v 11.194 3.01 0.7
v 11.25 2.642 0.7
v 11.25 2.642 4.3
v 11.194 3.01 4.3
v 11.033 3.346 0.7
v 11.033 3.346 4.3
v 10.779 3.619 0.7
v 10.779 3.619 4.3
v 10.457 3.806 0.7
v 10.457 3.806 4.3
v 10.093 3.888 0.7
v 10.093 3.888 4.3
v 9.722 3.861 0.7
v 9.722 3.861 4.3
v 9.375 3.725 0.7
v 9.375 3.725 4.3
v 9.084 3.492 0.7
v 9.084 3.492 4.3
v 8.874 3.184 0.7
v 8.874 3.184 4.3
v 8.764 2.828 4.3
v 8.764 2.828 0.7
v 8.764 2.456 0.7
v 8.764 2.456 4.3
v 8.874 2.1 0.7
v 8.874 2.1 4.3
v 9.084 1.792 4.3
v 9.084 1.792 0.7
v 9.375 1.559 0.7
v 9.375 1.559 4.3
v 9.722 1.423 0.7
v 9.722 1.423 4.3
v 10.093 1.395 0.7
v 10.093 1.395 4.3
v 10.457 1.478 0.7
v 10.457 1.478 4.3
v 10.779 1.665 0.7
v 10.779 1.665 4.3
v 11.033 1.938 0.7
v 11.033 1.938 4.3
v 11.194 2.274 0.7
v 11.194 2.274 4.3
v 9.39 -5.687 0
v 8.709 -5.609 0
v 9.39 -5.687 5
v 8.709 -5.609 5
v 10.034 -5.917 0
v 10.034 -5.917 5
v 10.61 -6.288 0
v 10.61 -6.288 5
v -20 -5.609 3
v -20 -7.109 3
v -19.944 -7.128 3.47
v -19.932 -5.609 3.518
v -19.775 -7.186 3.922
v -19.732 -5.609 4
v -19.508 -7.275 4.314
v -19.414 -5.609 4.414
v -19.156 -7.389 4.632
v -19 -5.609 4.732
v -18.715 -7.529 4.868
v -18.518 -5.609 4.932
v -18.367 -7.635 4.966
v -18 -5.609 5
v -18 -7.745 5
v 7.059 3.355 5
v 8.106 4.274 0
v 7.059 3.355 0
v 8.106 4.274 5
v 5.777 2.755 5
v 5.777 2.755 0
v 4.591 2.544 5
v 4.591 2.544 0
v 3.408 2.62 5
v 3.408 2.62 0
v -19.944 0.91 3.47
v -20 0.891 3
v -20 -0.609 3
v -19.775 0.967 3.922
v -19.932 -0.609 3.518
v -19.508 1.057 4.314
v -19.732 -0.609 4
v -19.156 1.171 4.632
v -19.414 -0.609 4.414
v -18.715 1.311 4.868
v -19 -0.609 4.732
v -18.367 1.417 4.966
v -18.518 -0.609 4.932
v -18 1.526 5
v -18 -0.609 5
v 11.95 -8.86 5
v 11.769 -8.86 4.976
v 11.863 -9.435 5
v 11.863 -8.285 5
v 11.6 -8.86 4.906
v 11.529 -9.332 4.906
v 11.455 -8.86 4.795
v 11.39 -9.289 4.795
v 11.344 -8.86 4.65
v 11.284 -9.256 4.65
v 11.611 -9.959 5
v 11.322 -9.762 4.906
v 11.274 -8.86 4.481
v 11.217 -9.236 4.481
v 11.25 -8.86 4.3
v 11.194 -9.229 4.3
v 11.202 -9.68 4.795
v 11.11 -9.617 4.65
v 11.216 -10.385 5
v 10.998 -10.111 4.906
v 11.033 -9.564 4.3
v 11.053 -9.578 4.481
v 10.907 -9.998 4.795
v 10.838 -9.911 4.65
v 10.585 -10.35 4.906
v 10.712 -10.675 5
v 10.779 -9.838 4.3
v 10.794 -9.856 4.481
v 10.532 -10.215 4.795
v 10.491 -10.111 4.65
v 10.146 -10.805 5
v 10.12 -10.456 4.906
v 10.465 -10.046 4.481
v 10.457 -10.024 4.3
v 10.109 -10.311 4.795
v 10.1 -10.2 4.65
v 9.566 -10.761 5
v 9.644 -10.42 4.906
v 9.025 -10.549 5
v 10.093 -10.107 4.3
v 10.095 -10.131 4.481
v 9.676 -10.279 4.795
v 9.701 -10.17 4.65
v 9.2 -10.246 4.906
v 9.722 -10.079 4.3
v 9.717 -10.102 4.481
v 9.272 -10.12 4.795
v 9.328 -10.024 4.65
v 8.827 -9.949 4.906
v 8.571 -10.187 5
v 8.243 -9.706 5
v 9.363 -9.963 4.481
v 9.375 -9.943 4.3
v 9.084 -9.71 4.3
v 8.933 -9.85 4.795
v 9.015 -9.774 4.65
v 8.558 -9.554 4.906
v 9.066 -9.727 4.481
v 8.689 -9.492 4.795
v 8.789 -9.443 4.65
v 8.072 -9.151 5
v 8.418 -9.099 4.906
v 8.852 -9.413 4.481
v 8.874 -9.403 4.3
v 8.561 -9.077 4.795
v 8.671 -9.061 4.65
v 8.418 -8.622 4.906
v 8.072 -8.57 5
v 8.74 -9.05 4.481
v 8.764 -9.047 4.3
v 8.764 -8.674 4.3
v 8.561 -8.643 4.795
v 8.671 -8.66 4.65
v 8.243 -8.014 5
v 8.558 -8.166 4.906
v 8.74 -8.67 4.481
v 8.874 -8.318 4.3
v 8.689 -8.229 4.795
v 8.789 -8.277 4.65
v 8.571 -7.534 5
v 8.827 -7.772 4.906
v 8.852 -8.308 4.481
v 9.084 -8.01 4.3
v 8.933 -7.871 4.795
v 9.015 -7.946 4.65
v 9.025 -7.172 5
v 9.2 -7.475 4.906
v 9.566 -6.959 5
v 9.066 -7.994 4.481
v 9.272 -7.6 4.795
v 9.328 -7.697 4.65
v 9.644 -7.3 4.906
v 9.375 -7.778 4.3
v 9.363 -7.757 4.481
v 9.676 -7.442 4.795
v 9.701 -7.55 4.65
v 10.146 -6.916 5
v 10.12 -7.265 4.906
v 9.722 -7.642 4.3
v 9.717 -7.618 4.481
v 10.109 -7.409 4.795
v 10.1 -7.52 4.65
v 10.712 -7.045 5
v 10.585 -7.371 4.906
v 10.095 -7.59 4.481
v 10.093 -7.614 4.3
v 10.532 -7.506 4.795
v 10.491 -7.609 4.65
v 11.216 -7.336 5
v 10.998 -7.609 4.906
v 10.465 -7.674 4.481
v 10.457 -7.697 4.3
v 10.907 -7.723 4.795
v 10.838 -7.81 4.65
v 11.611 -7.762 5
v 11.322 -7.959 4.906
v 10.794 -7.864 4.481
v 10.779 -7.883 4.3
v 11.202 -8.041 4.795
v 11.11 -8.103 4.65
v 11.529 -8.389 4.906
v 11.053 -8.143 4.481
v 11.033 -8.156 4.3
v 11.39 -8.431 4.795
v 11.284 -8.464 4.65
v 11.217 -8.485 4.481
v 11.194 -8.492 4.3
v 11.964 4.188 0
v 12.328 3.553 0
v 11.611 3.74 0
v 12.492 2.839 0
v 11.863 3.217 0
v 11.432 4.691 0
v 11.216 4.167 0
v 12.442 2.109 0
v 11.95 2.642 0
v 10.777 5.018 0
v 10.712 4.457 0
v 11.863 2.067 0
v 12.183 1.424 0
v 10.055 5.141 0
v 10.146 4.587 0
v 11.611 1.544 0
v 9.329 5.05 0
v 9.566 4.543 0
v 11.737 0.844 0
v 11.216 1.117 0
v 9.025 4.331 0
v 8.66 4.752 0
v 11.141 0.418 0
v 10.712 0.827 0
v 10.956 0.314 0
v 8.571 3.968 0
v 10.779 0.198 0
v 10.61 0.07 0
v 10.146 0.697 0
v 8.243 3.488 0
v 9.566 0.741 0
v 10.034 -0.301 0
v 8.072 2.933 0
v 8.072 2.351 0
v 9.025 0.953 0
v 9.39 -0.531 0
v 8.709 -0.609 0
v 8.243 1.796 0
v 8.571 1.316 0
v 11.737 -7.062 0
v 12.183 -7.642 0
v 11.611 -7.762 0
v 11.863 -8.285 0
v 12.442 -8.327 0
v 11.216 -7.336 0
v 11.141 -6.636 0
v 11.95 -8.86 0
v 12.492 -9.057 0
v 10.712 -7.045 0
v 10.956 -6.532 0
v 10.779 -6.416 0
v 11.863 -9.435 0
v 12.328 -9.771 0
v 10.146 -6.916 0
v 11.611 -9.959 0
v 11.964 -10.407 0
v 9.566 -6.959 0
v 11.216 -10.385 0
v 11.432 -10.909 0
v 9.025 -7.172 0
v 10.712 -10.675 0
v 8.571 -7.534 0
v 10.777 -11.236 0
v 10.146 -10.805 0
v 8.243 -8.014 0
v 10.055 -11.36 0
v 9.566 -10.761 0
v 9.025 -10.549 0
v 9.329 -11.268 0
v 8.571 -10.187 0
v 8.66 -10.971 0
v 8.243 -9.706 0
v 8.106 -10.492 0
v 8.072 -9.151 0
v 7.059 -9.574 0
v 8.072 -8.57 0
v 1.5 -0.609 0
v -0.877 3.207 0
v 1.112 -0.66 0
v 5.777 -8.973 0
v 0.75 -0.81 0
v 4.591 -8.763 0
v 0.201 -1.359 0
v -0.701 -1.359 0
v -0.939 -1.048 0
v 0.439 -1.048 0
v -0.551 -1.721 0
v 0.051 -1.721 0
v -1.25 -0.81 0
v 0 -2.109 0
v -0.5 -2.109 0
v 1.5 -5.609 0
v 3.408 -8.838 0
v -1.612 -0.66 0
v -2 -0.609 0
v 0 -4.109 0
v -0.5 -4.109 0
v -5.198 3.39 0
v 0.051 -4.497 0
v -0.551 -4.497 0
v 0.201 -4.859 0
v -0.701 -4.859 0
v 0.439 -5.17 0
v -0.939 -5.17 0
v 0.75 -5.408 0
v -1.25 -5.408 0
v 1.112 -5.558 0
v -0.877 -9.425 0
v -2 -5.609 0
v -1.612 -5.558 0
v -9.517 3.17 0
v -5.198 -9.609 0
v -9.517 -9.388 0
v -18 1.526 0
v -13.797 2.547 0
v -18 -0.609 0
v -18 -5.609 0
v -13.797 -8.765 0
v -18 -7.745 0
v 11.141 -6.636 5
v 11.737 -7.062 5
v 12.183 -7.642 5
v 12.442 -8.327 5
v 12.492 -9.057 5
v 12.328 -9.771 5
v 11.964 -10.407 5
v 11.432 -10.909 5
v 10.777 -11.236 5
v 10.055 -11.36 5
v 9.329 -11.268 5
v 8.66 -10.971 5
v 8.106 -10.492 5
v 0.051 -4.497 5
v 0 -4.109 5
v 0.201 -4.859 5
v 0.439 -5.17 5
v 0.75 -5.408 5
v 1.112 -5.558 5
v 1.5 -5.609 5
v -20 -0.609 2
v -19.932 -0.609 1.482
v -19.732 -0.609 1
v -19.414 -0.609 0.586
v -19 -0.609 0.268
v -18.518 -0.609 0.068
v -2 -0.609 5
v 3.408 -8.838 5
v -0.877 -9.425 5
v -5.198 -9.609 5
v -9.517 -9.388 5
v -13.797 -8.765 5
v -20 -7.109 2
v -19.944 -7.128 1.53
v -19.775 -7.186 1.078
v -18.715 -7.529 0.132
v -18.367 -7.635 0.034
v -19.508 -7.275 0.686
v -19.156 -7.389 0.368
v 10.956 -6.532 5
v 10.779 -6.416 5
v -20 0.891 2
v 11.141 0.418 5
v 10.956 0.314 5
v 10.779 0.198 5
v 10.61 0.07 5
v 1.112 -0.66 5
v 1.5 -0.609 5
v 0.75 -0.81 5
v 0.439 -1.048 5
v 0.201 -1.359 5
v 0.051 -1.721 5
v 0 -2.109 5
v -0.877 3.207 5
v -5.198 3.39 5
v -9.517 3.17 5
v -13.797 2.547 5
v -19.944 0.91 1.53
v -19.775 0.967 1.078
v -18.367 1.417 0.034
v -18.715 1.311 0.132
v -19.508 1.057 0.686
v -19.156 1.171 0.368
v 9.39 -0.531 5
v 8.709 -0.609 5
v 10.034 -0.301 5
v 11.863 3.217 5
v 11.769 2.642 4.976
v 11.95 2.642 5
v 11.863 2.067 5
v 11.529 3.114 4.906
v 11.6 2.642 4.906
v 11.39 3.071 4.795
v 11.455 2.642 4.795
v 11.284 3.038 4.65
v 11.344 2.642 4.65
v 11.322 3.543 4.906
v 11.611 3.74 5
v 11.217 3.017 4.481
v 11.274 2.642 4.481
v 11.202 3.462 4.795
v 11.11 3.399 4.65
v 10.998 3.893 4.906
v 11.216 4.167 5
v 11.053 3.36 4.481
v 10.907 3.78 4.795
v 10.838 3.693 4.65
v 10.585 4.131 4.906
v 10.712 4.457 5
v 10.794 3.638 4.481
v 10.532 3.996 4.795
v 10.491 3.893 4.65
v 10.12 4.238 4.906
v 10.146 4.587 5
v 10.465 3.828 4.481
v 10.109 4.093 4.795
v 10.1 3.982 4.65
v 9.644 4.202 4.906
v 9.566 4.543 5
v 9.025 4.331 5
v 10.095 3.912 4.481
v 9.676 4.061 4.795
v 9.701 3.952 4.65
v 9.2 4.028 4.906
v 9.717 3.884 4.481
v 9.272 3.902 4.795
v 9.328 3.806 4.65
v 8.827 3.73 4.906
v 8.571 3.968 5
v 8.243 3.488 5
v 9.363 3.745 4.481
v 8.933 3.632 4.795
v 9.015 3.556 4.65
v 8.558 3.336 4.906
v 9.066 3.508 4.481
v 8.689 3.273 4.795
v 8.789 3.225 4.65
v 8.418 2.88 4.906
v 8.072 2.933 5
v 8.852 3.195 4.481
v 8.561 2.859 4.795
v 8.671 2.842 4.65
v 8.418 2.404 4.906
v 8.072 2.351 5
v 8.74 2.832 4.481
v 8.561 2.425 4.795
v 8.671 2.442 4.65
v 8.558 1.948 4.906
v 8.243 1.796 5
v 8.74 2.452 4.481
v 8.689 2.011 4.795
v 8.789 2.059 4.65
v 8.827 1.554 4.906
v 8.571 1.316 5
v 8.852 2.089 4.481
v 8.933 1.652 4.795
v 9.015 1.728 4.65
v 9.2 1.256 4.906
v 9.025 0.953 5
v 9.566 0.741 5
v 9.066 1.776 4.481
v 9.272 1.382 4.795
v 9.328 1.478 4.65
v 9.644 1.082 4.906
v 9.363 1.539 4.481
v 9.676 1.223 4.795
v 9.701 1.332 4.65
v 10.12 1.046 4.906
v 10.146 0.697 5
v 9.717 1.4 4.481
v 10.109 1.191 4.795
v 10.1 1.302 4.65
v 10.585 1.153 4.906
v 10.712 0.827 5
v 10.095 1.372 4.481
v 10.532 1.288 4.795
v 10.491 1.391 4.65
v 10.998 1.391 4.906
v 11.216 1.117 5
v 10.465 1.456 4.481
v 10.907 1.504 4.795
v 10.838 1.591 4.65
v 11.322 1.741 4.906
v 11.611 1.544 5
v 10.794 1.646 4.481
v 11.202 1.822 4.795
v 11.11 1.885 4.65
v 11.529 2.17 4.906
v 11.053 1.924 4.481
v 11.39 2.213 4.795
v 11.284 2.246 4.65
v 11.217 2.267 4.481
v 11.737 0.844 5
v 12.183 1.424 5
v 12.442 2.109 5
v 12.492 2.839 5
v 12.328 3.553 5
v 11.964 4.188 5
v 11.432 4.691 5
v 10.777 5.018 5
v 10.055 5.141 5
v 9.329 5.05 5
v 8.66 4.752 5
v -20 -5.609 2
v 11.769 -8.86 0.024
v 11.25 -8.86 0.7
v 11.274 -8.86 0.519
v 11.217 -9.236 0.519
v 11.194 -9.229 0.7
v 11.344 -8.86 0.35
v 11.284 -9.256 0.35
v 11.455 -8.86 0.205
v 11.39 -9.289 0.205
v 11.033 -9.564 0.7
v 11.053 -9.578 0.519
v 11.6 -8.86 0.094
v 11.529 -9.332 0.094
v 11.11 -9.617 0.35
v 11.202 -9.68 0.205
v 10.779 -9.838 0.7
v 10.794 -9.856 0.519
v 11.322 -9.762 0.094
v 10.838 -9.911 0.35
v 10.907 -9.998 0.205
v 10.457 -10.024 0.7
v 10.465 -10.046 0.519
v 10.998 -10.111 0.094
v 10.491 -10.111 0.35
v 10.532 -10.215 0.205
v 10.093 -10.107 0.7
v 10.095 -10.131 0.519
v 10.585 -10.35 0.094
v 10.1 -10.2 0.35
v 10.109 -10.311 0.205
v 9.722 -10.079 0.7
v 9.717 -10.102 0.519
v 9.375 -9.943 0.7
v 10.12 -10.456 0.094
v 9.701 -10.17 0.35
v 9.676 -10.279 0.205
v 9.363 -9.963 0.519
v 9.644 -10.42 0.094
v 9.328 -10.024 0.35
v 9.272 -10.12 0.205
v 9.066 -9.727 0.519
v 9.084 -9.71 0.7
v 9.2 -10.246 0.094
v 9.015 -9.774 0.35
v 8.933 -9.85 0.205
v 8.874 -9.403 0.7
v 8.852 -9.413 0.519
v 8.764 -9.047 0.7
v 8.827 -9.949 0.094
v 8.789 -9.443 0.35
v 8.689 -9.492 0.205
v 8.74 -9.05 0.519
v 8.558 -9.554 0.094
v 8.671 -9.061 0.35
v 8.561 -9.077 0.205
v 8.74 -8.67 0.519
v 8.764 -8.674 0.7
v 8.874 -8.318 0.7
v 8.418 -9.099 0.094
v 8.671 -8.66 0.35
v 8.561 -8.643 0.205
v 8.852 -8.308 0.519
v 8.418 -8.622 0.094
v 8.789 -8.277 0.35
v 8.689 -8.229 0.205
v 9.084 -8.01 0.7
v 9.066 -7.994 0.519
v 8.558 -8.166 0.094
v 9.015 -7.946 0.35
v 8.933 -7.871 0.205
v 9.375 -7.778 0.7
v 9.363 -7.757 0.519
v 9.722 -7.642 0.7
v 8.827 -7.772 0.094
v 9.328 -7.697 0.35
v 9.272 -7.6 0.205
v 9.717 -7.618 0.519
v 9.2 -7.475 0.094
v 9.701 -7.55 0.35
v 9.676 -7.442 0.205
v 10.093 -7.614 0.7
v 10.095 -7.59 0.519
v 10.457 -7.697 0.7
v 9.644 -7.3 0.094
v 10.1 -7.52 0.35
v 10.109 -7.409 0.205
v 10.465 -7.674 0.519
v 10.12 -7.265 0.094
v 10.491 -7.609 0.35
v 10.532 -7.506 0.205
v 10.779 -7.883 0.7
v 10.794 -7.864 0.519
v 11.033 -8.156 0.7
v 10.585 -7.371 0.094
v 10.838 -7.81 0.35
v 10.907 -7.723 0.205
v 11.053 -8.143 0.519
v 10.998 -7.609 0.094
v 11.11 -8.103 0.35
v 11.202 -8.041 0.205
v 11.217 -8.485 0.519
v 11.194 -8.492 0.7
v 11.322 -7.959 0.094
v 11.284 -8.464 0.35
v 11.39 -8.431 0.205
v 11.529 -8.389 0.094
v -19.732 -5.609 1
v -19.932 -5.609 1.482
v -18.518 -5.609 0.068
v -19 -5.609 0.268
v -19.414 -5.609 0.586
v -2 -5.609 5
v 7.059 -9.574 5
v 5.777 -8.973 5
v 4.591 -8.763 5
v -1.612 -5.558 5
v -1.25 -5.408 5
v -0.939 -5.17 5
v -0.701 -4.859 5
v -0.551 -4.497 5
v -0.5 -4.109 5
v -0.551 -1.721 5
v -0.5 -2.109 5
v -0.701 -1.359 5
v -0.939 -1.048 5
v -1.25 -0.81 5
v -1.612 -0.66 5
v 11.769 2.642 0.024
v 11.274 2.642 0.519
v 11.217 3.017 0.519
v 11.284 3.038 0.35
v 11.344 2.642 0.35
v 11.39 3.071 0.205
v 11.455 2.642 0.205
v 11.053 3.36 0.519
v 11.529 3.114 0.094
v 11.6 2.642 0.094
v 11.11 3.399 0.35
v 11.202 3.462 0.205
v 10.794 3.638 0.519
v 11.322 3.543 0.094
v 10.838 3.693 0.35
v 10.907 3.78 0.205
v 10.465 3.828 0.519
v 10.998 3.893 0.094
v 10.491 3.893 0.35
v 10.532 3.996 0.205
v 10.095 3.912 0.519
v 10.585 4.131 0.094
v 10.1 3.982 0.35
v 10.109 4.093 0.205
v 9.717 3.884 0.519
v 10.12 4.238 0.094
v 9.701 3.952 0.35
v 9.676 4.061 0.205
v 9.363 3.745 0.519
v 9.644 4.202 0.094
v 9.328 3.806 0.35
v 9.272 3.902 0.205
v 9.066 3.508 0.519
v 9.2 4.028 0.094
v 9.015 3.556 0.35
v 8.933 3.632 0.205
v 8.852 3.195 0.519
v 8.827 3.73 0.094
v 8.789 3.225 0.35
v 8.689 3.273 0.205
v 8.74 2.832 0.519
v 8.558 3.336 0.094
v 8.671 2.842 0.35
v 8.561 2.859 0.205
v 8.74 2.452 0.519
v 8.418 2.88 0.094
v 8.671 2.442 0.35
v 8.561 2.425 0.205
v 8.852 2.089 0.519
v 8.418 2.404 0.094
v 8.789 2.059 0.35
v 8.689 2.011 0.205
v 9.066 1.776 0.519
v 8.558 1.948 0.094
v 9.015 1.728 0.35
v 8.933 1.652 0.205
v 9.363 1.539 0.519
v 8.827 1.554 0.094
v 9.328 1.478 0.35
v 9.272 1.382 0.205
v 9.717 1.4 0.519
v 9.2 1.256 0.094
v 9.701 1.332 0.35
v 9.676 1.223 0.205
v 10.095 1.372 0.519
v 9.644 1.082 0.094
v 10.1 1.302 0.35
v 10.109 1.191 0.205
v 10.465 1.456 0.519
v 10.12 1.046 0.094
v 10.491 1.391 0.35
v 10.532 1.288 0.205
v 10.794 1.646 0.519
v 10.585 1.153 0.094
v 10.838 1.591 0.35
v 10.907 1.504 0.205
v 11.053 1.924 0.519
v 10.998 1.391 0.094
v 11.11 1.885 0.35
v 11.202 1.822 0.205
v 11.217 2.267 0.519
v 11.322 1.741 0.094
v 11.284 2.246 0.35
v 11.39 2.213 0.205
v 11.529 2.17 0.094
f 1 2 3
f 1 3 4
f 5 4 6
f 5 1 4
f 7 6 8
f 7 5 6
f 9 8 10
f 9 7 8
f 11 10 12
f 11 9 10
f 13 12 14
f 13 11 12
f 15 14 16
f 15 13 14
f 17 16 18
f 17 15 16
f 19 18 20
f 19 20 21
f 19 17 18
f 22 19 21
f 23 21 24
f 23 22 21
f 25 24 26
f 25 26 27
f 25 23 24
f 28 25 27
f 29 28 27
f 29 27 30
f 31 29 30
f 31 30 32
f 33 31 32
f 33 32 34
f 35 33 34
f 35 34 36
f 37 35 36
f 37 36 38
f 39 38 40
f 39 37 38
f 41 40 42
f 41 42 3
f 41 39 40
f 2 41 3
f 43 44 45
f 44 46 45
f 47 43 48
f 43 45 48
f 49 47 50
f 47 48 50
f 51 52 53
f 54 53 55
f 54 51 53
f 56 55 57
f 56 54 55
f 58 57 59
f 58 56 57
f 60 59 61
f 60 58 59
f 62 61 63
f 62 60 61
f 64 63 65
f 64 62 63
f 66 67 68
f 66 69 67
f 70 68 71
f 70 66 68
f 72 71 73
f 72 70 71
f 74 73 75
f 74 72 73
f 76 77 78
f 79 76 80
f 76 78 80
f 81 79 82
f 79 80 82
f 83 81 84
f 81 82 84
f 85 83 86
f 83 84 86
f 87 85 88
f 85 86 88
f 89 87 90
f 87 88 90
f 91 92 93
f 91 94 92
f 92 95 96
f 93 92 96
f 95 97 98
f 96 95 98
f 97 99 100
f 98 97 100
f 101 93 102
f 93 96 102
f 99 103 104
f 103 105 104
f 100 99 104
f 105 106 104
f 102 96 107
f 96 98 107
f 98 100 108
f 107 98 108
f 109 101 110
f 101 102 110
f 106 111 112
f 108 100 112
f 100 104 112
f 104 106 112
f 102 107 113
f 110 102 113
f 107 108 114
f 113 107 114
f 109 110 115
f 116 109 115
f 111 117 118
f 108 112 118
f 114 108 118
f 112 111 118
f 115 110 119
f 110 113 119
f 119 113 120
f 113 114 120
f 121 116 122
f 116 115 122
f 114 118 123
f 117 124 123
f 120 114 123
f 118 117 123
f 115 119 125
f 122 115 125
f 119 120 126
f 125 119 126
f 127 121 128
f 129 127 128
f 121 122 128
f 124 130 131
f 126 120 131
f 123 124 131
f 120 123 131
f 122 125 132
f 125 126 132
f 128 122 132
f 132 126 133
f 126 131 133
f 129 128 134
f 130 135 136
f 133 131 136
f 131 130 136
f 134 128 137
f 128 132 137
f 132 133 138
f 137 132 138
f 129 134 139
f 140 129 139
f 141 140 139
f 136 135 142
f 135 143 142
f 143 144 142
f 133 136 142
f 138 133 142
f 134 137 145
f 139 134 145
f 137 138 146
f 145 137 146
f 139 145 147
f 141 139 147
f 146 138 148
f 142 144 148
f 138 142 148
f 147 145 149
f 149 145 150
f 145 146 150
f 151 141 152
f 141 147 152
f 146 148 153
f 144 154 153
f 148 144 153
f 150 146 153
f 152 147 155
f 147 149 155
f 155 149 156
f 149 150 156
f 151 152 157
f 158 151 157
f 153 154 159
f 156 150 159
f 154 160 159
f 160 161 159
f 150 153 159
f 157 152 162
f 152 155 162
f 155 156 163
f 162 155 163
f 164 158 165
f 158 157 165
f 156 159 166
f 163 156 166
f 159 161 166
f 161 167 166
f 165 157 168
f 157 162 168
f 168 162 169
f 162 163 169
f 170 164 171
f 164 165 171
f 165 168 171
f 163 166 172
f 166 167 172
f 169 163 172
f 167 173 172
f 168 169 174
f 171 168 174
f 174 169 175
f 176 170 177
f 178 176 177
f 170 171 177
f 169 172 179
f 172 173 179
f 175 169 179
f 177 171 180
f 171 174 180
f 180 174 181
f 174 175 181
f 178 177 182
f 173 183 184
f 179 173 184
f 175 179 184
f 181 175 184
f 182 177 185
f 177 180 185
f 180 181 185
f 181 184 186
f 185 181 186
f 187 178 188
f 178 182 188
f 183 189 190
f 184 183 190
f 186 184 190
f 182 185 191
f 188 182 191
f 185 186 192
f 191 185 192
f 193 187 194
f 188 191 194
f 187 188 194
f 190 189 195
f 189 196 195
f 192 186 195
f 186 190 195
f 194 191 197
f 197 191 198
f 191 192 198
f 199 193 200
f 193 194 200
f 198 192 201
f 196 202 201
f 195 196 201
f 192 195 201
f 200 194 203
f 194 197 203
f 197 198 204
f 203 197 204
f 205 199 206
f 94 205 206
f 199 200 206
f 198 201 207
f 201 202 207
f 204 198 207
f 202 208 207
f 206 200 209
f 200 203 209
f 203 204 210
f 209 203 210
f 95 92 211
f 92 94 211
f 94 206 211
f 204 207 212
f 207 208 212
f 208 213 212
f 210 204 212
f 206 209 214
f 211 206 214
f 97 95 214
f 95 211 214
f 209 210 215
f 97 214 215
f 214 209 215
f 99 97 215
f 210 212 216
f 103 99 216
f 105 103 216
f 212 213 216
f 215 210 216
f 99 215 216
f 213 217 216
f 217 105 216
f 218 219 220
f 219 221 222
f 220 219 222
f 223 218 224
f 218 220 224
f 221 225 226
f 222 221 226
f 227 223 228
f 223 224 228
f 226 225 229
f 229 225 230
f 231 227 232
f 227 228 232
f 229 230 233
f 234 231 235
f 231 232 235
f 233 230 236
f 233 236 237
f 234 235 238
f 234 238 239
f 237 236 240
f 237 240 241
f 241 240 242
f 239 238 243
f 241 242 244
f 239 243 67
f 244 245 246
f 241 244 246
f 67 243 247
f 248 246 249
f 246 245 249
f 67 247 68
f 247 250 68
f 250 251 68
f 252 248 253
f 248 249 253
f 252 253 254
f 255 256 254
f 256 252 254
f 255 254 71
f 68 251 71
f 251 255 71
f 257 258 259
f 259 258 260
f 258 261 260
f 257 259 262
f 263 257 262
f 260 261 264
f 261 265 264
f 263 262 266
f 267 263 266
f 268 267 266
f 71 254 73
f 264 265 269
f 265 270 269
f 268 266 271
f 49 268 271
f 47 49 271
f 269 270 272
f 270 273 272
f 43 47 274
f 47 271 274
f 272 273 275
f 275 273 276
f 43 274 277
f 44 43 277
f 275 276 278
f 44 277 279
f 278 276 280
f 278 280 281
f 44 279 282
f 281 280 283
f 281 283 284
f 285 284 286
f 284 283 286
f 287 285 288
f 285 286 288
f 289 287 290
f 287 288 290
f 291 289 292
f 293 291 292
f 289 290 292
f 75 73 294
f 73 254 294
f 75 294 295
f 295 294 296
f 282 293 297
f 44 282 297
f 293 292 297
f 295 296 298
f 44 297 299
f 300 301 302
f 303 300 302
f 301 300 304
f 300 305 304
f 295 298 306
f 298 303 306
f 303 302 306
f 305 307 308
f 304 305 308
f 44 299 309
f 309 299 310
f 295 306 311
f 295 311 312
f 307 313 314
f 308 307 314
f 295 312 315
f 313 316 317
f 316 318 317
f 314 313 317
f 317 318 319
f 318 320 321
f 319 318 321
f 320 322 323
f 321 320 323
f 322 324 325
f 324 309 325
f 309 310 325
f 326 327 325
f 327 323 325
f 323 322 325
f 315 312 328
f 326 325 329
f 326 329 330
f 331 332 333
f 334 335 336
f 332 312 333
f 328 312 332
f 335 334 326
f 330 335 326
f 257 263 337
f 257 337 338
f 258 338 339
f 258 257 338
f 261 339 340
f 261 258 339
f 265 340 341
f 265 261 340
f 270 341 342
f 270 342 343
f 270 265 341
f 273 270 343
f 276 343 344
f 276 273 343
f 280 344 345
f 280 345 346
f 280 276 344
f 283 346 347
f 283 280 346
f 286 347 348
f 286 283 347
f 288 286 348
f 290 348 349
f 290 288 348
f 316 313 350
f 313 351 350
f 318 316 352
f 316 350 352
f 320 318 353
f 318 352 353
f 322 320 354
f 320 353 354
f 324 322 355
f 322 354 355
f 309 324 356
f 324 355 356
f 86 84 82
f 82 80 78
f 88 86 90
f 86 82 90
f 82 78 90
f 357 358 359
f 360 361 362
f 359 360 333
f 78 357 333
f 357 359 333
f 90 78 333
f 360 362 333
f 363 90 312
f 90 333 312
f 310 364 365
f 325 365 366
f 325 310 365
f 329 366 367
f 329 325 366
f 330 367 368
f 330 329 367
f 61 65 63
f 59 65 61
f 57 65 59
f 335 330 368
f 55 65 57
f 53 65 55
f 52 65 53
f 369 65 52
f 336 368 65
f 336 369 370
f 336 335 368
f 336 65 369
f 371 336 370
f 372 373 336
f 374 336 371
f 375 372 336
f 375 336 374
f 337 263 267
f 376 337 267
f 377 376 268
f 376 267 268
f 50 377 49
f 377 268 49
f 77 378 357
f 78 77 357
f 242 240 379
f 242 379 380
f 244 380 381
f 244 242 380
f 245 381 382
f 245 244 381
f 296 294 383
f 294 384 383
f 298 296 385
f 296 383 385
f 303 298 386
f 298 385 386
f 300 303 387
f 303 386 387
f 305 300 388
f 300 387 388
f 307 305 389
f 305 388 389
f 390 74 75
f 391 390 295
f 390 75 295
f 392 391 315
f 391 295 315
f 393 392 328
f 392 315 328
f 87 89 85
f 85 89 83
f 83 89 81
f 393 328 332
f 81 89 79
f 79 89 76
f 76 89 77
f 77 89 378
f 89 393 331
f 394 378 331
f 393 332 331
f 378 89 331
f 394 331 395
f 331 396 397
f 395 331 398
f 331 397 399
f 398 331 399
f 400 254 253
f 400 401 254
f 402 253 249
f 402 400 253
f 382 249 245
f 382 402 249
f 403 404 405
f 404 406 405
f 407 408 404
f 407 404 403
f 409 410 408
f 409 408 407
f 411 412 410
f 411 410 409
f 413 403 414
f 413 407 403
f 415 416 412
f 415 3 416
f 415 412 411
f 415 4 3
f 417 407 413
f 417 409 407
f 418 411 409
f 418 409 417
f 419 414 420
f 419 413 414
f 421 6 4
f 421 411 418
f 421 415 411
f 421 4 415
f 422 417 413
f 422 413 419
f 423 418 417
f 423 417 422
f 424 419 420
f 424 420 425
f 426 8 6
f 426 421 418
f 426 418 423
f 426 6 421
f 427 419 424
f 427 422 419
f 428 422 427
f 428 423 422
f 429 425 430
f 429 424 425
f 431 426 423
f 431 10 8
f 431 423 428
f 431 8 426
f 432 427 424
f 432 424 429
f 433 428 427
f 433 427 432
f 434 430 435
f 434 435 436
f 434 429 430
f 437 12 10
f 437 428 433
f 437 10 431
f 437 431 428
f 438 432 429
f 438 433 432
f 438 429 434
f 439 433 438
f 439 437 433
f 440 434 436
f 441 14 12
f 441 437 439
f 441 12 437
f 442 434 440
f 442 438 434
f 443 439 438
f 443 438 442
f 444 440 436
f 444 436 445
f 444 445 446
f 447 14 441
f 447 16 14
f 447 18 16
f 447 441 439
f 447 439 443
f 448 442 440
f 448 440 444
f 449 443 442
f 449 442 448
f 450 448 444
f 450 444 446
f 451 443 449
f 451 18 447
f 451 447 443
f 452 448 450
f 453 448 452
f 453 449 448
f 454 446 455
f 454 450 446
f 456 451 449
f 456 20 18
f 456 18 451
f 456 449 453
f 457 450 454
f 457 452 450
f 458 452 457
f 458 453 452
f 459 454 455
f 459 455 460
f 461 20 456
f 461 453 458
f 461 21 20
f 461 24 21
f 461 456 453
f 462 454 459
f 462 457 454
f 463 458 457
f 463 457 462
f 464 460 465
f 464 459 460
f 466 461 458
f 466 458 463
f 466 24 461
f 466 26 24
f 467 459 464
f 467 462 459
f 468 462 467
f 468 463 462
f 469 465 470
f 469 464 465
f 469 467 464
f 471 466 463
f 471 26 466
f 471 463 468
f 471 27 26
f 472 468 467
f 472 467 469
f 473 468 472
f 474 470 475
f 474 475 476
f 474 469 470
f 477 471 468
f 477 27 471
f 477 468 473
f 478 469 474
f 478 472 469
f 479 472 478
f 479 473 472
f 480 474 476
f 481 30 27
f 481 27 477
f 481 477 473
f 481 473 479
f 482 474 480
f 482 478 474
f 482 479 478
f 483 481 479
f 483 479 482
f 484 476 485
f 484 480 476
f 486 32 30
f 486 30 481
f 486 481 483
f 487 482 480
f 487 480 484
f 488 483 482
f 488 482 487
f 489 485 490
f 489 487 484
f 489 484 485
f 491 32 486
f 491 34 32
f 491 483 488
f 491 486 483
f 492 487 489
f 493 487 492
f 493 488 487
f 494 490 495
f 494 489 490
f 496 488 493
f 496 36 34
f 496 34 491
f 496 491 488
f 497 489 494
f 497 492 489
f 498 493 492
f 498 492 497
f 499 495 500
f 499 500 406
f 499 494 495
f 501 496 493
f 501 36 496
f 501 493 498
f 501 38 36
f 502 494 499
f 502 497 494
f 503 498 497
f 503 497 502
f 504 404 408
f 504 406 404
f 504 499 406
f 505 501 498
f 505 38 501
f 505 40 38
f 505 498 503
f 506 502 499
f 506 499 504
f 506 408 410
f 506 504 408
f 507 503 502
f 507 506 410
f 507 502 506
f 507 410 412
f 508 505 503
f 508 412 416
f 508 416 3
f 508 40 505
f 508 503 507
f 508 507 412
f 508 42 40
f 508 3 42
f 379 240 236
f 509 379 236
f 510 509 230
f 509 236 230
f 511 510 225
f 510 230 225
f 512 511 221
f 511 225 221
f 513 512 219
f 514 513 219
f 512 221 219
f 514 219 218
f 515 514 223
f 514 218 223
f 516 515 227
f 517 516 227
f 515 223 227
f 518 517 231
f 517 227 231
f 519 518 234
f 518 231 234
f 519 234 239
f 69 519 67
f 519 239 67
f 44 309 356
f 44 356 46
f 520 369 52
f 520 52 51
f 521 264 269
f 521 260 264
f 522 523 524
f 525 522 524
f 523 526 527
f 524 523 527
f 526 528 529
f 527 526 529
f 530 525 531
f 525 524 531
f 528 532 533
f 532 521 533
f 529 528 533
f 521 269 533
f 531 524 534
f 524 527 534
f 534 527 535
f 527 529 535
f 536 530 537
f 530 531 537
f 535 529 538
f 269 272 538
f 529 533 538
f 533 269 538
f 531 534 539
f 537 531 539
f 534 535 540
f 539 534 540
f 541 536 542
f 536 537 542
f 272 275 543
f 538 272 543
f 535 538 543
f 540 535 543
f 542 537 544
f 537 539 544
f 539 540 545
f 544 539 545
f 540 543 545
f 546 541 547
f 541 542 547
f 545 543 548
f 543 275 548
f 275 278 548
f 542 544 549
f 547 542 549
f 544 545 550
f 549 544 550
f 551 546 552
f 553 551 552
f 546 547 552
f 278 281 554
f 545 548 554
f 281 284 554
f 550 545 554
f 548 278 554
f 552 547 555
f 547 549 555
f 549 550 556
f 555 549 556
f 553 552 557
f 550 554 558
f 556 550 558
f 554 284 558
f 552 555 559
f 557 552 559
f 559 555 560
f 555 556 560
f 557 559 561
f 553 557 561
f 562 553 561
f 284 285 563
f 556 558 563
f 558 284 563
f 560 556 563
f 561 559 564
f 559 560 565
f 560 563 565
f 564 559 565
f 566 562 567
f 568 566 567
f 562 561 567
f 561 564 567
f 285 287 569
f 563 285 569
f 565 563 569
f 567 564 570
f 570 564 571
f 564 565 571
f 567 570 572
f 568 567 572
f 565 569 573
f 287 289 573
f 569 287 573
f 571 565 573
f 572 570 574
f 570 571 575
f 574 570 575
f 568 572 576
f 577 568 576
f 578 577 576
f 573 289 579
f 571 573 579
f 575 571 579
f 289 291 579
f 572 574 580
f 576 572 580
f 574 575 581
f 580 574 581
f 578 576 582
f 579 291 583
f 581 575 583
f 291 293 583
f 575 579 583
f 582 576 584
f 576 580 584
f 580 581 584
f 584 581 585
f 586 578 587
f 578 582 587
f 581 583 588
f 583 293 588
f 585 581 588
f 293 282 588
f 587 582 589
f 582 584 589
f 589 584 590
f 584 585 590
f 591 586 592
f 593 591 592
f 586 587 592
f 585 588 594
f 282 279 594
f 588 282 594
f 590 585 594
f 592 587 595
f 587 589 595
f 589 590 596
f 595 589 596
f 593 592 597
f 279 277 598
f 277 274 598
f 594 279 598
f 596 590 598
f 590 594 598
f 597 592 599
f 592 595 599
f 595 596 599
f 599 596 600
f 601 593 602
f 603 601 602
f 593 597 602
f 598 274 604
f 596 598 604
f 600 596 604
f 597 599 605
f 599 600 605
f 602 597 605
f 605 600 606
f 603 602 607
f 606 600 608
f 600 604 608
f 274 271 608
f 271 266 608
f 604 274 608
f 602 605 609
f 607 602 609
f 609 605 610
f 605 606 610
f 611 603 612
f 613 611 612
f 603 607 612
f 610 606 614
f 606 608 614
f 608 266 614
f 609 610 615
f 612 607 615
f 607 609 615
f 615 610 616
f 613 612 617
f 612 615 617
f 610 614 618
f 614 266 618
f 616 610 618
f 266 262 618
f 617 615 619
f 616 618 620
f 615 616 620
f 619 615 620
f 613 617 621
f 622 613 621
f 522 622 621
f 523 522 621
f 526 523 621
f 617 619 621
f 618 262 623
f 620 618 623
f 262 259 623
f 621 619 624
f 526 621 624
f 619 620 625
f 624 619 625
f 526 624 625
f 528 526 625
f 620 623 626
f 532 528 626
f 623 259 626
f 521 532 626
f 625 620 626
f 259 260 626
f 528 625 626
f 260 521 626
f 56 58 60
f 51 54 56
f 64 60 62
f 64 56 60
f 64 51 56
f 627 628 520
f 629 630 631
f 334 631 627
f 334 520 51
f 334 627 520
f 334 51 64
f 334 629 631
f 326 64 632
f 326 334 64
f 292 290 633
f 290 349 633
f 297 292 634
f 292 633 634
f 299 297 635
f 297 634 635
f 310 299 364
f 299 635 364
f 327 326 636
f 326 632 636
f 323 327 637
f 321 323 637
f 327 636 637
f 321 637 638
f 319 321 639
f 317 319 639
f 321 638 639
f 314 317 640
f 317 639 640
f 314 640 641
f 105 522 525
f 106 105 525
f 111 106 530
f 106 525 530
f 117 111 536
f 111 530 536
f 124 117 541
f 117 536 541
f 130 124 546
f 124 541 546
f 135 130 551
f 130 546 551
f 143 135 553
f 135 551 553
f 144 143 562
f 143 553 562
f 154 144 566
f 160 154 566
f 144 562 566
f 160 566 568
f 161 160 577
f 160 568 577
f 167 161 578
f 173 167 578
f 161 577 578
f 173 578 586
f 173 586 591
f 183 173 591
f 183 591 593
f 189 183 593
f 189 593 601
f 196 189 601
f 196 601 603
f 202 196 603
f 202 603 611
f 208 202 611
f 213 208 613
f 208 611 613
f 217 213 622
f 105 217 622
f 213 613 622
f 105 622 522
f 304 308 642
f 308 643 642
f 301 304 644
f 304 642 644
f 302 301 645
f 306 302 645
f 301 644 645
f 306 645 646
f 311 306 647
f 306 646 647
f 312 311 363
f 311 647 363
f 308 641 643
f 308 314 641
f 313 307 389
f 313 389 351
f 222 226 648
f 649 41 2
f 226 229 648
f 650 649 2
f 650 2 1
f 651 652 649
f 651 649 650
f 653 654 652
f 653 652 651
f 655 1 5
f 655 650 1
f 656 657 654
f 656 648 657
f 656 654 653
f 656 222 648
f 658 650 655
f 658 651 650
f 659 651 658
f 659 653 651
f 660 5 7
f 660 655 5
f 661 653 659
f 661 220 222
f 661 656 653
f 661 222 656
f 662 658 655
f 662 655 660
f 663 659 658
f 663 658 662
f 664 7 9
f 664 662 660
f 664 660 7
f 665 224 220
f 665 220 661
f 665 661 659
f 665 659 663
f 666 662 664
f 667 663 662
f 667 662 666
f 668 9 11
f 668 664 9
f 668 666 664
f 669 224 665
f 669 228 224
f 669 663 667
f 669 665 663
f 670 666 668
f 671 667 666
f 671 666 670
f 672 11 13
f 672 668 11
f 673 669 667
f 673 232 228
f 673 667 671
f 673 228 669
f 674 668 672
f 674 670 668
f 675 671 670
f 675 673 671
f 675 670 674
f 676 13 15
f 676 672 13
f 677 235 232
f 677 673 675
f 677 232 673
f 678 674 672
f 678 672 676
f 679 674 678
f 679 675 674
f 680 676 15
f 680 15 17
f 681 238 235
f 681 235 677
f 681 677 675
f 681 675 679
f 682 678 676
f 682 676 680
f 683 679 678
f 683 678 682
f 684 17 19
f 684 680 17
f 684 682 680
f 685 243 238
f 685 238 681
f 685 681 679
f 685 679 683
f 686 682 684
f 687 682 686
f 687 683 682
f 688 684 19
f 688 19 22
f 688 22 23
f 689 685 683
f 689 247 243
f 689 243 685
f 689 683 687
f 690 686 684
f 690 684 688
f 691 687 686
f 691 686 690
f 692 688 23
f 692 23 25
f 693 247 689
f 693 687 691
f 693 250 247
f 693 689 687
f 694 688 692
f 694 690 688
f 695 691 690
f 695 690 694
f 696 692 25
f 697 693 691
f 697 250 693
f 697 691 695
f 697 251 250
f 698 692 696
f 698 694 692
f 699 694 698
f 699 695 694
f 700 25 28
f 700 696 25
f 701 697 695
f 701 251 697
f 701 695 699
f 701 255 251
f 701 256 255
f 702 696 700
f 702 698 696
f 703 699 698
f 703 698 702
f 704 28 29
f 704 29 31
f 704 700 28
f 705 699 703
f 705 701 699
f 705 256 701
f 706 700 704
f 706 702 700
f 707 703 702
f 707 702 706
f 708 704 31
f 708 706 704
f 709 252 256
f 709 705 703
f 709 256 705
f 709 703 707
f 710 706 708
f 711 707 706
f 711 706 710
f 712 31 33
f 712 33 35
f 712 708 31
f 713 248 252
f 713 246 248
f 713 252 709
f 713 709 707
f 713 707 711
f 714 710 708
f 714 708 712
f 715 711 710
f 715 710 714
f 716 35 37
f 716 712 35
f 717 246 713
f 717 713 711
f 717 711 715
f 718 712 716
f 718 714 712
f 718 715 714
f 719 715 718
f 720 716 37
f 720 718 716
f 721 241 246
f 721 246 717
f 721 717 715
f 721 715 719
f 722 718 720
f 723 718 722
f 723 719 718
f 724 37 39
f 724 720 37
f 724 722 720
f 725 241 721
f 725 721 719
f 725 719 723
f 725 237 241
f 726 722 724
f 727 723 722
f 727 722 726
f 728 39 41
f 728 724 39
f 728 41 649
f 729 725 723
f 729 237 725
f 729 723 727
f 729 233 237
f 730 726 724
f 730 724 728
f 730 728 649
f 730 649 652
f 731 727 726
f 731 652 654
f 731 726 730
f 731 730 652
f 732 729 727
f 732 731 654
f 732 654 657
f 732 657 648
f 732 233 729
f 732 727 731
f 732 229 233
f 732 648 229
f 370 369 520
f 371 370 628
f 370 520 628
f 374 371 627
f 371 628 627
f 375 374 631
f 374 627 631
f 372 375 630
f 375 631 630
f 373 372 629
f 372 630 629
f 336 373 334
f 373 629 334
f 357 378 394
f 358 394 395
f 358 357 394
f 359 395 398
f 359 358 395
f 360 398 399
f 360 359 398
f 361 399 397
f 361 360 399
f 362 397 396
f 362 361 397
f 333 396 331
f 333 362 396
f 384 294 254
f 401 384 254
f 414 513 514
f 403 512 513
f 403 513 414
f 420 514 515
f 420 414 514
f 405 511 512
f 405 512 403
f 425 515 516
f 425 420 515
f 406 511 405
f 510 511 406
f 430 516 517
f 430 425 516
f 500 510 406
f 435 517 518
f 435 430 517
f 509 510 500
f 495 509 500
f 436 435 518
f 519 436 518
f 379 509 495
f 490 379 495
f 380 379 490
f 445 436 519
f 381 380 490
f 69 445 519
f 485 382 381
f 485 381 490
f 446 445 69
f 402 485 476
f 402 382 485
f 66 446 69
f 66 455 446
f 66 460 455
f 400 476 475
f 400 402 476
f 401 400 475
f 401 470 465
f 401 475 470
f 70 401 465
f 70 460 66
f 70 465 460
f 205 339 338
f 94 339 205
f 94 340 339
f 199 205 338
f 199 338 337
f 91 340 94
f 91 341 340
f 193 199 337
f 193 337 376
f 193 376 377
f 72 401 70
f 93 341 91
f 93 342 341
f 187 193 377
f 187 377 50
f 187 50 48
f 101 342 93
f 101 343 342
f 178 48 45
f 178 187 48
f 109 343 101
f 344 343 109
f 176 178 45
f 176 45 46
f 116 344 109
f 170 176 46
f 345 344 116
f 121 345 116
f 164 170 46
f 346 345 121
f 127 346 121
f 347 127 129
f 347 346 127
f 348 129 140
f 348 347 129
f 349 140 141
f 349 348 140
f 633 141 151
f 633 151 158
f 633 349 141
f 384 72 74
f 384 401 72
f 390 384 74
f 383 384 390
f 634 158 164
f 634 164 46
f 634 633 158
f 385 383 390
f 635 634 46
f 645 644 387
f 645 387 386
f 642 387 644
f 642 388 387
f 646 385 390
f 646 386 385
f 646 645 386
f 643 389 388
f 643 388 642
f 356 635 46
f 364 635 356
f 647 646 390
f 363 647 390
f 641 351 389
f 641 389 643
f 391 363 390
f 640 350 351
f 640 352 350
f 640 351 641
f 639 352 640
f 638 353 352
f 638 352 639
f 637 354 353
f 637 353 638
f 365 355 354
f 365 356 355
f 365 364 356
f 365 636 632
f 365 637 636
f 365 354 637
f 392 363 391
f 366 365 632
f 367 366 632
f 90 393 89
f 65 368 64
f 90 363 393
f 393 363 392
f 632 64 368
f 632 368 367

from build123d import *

# Parameters (mm, degrees)
SKETCH1_R           = 1.25
BOSS_EXTRUDE1_DEPTH = 5
FILLET3_R           = 2
FILLET4_R           = 3
FILLET5_R           = 5
FILLET6_R           = 1.5
FILLET8_R           = 0.7
FILLET9_R           = 3


with BuildPart() as part:
    # Sketch1 → Boss-Extrude1 (new body)
    with BuildSketch(Plane.XY):
        with BuildLine():
            Line((10, -0.609130042), (10, 0.141993323))
            ThreePointArc((10, 0.141993323), (11.352749323, 4.744389401), (7.724788103, 1.605937907))
            ThreePointArc((7.724788103, 1.605937907), (-6.192467122, 3.375494669), (-20, 0.890869958))
            Line((-20, 0.890869958), (-20, -0.609130042))
            Line((-20, -0.609130042), (-0.5, -0.609130042))
            Line((-0.5, -0.609130042), (-0.5, -3.109130042))
            Line((-0.5, -3.109130042), (0, -3.109130042))
            Line((0, -3.109130042), (0, -0.609130042))
            Line((0, -0.609130042), (10, -0.609130042))
        make_face()
        with Locations((10, 2.641993323)):
            Circle(SKETCH1_R, mode=Mode.SUBTRACT)
    extrude(amount=BOSS_EXTRUDE1_DEPTH)

    # Fillet3
    fillet3_edges = [part.edges().sort_by_distance(p)[0] for p in [
        (-20, 0.140869958, 0),
        (-20, 0.140869958, 5),
    ]]
    fillet(fillet3_edges, radius=FILLET3_R)

    # Fillet4
    # the kernel refuses this fillet: 3 mm, written as the material it adds along each edge
    with BuildSketch(Plane(origin=(10, 0.141993323, 0), x_dir=(0.9720485785633484, 0.23477981368289305, 0), z_dir=(0, 0, 1))) as fillet4_piece_1:
        with BuildLine():
            CenterArc((1.878238509, -2.916145736), FILLET4_R, 103.578643904, 29.646140471)
            Line((-0.176348604, -0.730128399), (-0.217440346, -0.686408053))
            ThreePointArc((-0.217440346, -0.686408053), (-0.146497217, -0.350977411), (-0.058322915, 0.014086789))
            Line((-0.058322915, 0.014086789), (0.014086789, 0.058322915))
            ThreePointArc((0.014086789, 0.058322915), (0.586949534, -0.009878554), (1.15981228, 0.058322915))
            Line((1.15981228, 0.058322915), (1.173899068, 0))
        make_face()
    extrude(amount=5)

    # Fillet5
    fillet5_edges = [part.edges().sort_by_distance(p)[0] for p in [
        (7.724788103, 1.605937907, 2.5),
    ]]
    fillet(fillet5_edges, radius=FILLET5_R)

    # Mirror2: part across plane


with BuildPart() as part_1:
    add(part.part)
    add(part.part.mirror(Plane(origin=(0, -3.109130042, 0), x_dir=(0, 0, 1), z_dir=(0, -1, 0))))

    # Fillet6
    fillet6_edges = [part_1.edges().sort_by_distance(p)[0] for p in [
        (0, -0.609130042, 2.5),
        (-0.5, -0.609130042, 2.5),
        (-0.5, -5.609130042, 2.5),
        (0, -5.609130042, 2.5),
    ]]
    fillet(fillet6_edges, radius=FILLET6_R)

    # Fillet8
    fillet8_edges = [part_1.edges().sort_by_distance(p)[0] for p in [
        (8.75, 2.641993323, 5),
        (8.75, 2.641993323, 0),
        (8.75, -8.860253407, 5),
        (8.75, -8.860253407, 0),
    ]]
    fillet(fillet8_edges, radius=FILLET8_R)

    # Fillet9
    fillet9_edges = [part_1.edges().sort_by_distance(p)[0] for p in [
        (10, -0.609130042, 2.5),
        (10, -5.609130042, 2.5),
    ]]
    fillet(fillet9_edges, radius=FILLET9_R)


solid = part_1.part
